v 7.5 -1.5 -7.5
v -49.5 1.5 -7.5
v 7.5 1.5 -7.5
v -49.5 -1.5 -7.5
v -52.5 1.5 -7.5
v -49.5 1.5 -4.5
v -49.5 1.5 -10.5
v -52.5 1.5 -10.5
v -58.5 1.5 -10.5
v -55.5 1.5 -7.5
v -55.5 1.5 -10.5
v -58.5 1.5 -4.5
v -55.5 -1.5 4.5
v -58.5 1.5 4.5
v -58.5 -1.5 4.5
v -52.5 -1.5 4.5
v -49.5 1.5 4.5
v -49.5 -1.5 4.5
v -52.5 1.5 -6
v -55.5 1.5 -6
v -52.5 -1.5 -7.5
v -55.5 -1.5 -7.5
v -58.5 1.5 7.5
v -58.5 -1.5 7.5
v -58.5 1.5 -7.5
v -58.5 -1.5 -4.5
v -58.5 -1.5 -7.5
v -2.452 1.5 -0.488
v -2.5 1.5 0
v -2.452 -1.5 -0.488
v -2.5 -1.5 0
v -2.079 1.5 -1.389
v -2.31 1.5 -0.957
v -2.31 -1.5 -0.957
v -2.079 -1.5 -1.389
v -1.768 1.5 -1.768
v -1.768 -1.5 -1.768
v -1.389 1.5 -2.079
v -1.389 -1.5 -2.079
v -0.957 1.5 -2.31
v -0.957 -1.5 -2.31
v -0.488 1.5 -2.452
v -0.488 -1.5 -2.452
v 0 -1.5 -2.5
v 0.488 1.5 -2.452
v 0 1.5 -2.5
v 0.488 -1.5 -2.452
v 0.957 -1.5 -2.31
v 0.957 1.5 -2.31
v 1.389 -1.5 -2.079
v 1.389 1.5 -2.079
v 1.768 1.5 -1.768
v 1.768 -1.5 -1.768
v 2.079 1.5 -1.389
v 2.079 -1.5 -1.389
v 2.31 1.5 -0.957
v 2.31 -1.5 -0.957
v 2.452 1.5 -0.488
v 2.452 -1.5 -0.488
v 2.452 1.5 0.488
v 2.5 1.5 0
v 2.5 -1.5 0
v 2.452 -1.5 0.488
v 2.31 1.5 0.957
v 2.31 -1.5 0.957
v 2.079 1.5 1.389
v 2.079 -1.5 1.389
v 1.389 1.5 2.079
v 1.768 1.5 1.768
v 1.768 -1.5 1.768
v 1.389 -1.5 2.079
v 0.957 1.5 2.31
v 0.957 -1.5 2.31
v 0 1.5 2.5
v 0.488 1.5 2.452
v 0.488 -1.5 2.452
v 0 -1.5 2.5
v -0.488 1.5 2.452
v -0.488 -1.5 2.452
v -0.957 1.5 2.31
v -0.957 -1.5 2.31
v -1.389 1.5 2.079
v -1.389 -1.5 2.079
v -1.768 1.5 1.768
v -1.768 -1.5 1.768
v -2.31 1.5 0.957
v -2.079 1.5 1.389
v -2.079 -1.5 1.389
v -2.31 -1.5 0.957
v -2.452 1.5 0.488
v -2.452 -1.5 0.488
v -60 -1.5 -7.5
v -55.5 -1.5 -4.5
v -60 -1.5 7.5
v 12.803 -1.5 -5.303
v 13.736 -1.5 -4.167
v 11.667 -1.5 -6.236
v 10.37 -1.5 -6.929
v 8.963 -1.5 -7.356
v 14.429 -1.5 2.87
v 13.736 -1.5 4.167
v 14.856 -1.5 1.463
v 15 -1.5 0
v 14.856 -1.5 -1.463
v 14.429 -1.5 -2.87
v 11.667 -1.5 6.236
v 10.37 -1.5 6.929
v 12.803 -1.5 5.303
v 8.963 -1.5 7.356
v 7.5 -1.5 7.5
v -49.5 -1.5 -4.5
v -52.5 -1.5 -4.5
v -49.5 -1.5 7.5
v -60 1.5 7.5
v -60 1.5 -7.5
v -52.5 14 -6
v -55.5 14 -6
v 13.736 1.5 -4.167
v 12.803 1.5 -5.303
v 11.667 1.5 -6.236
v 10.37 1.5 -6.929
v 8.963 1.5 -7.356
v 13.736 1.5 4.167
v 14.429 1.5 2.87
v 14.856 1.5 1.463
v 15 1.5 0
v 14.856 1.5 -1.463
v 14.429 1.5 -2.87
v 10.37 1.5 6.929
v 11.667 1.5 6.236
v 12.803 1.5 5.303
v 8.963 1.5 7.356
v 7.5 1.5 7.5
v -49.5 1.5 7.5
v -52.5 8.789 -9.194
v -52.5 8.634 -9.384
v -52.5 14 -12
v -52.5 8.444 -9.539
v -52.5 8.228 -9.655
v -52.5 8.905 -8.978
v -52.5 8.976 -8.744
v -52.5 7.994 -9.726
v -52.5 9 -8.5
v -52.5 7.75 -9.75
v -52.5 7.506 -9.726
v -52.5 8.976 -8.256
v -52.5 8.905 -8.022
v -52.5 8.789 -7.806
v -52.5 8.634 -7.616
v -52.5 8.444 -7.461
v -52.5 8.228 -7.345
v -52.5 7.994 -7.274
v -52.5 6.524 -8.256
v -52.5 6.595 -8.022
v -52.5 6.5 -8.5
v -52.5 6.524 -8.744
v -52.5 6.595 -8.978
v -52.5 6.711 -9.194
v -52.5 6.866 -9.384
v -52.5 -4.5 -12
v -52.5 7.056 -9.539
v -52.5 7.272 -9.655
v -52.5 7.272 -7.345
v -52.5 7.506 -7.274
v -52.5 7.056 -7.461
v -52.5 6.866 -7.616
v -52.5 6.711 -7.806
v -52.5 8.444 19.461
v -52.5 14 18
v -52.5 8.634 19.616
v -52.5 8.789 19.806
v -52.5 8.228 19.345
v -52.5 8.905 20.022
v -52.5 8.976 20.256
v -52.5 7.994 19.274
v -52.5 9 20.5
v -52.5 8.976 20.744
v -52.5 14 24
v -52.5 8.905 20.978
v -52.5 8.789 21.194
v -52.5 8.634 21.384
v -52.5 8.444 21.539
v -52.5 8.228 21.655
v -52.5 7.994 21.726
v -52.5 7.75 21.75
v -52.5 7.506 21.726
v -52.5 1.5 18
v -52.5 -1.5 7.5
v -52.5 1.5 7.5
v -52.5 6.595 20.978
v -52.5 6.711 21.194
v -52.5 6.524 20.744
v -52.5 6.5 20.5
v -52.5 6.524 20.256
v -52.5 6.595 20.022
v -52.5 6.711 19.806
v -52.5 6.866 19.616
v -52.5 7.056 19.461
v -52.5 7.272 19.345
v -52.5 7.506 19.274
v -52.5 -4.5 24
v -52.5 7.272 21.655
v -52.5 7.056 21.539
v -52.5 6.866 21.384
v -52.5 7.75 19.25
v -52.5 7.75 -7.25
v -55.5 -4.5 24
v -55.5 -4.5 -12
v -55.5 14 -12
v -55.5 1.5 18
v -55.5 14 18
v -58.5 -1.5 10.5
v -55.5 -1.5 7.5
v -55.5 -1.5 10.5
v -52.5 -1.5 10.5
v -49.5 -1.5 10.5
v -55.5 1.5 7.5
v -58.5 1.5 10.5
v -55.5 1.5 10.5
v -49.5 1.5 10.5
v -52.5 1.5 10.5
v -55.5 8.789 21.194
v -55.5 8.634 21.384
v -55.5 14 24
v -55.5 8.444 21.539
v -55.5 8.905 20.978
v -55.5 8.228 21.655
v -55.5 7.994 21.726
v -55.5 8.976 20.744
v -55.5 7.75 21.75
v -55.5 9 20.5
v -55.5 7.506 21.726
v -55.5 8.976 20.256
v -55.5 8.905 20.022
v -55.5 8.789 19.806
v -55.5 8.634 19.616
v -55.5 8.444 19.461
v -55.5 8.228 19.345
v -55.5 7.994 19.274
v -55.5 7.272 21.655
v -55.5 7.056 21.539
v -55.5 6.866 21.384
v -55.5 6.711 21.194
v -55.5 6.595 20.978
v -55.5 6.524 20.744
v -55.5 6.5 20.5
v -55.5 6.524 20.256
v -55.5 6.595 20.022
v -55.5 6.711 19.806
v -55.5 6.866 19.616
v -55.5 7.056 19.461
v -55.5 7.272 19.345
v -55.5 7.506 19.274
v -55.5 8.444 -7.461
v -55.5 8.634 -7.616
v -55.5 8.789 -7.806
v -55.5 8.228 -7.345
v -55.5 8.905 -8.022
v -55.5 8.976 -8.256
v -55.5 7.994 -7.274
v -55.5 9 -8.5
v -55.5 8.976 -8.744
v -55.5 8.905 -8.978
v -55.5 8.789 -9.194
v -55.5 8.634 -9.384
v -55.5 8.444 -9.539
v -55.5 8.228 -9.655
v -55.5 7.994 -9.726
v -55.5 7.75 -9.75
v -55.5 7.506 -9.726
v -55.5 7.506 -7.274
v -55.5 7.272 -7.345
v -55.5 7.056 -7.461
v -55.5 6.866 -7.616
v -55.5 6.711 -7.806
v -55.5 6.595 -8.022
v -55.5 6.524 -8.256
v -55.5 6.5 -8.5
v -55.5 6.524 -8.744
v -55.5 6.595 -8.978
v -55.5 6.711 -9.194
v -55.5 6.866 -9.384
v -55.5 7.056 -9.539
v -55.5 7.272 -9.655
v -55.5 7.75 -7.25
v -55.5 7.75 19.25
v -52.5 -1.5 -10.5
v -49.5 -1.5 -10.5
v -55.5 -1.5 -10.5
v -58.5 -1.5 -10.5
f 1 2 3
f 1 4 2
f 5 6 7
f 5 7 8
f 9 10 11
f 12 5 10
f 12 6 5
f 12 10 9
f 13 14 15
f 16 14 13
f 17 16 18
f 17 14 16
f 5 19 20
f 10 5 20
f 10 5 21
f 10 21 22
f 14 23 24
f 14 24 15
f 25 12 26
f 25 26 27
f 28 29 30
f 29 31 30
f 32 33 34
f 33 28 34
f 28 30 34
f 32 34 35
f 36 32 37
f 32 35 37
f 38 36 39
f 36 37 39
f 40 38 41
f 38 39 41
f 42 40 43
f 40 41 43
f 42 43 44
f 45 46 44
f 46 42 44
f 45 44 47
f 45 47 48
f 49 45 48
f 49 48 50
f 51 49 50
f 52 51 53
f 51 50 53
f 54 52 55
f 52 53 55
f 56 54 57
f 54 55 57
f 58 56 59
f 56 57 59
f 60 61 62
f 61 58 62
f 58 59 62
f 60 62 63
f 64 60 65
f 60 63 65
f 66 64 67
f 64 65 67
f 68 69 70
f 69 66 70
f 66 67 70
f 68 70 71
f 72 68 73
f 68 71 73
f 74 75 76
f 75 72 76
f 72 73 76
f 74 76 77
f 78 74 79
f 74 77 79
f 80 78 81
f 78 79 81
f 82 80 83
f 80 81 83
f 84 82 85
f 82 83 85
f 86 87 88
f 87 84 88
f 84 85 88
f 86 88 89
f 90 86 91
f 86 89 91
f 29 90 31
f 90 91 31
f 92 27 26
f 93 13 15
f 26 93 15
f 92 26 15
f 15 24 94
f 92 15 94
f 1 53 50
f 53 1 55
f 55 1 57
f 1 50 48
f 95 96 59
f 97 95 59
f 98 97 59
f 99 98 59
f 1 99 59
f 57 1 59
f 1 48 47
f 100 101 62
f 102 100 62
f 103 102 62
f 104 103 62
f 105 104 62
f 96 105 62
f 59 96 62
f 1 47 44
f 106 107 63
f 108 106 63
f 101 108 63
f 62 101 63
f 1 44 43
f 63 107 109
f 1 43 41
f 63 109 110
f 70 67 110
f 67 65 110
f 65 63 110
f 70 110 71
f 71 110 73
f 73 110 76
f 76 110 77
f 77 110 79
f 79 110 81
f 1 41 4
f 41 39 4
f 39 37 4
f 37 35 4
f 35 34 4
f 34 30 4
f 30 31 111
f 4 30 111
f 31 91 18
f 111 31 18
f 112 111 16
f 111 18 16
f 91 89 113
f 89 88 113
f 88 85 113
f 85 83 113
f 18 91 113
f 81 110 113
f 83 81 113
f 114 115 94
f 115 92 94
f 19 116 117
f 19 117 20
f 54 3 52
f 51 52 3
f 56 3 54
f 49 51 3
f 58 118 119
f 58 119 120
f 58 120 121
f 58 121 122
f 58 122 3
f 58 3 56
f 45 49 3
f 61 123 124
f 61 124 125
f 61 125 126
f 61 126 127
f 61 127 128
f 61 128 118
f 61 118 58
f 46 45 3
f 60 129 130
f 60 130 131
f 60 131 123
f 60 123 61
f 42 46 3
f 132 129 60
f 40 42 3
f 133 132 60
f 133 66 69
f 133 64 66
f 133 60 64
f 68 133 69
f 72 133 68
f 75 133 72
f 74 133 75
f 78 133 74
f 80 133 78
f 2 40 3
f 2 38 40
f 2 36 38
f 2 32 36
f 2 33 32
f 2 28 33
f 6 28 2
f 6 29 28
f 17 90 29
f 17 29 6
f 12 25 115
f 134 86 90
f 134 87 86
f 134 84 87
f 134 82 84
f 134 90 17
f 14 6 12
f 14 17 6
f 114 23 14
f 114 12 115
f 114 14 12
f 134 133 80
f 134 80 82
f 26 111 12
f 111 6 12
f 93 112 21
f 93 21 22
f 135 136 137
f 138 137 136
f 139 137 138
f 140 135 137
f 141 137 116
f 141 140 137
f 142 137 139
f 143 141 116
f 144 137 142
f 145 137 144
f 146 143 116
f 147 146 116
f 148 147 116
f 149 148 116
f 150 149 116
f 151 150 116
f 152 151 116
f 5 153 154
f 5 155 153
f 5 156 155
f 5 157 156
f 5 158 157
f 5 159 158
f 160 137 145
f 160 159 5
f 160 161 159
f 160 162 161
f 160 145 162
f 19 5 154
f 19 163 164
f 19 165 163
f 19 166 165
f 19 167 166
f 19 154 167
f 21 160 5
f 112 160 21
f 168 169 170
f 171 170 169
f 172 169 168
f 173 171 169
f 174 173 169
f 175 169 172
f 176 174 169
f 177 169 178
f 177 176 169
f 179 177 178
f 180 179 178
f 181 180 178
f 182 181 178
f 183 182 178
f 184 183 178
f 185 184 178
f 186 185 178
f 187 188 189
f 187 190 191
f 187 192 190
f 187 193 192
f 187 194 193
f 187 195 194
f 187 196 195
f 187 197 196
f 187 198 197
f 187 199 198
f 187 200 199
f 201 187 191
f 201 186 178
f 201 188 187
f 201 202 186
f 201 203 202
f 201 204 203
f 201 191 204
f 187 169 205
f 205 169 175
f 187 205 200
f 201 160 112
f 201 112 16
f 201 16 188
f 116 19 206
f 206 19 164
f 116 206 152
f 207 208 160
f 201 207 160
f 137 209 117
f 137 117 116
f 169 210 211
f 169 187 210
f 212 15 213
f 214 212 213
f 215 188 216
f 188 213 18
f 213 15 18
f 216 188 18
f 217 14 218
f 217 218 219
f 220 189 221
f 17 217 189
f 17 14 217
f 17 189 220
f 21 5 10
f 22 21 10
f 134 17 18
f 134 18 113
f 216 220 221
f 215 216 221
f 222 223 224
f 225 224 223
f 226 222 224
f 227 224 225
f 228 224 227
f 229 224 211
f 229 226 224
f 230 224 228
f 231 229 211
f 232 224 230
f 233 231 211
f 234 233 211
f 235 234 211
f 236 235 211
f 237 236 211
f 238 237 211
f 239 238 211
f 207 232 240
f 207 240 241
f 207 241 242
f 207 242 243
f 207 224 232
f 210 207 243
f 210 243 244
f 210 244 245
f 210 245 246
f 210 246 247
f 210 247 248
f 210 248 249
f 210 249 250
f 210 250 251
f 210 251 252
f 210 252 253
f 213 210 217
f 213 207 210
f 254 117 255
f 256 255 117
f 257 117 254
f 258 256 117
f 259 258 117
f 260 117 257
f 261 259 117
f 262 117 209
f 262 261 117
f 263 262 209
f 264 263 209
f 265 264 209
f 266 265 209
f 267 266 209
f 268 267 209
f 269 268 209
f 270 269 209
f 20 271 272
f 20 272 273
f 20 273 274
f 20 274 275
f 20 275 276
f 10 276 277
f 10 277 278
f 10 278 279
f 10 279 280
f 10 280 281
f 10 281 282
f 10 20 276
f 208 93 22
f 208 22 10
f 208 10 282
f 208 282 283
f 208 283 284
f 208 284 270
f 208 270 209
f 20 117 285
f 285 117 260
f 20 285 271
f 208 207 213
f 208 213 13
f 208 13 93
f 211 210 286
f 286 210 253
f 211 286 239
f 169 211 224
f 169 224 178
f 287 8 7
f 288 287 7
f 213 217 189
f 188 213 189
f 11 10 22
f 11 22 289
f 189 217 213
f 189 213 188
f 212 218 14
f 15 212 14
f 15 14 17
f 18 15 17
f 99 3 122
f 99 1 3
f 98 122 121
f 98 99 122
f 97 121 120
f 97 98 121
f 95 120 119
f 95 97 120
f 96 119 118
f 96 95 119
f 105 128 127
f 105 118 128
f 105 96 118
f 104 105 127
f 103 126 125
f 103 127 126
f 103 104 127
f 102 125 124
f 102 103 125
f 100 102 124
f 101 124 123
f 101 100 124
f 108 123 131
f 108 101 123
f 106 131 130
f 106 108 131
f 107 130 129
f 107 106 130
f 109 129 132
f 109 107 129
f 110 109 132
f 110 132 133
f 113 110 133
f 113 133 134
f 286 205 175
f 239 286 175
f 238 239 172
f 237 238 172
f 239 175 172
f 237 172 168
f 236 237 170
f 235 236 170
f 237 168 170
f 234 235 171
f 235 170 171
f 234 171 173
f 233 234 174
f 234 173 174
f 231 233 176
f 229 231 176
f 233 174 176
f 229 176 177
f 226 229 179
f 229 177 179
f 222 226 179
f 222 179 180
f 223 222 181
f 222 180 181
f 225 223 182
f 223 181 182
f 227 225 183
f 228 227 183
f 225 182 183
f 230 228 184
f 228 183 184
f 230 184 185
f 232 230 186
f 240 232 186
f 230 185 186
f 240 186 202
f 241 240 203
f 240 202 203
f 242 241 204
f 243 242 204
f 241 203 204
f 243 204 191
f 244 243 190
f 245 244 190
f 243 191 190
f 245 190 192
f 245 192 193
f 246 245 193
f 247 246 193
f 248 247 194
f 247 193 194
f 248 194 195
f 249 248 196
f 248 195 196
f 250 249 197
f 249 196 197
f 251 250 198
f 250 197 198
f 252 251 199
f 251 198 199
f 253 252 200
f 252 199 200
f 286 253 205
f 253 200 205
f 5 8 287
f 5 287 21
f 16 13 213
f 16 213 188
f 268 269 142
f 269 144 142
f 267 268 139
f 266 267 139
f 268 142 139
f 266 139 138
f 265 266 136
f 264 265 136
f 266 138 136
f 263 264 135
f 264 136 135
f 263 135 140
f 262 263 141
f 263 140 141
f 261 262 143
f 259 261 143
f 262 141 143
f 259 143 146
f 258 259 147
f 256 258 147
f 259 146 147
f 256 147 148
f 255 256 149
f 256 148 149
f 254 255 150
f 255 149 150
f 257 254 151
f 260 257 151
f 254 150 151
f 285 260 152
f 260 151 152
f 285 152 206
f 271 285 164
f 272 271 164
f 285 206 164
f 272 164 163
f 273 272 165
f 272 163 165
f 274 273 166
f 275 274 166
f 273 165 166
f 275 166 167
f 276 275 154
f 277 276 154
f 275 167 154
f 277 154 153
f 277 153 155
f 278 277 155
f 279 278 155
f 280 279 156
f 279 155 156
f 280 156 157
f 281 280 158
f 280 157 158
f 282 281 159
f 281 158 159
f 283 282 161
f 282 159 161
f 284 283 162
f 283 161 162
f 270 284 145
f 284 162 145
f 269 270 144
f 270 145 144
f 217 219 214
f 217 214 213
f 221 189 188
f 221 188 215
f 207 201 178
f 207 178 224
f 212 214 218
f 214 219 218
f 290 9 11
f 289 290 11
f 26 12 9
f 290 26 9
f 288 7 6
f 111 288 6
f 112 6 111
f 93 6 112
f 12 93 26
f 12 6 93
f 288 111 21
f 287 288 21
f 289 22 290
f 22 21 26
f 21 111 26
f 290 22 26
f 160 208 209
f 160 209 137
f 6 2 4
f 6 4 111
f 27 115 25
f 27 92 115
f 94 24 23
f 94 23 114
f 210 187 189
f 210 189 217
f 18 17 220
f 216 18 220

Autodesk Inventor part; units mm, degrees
ref_plane "YZ Plane" through (0, 0, 0) normal (1, 0, 0) x (0, 1, 0)
ref_plane "XZ Plane" through (0, 0, 0) normal (0, 1, 0) x (-1, 0, 0)
ref_plane "XY Plane" through (0, 0, 0) normal (0, 0, 1) x (1, 0, 0)
sketch "草圖1" plane through (0, 0, 0) normal (0, 1, 0) x (-1, 0, 0)
  circle A0 centre (0, 0) radius 2.5
  line L0 (-15, 0) -> (60, 0) construction
  line L1 (-7.5, 7.5) -> (52.5, 7.5)
  line L2 (52.5, -7.5) -> (-7.5, -7.5)
  arc A1 (-7.5, 7.5) -> (-7.5, -7.5) centre (-7.5, 0) ccw
  arc A2 (52.5, -7.5) -> (52.5, 7.5) centre (52.5, 0) ccw
  line L3 (52.5, -7.5) -> (60, -7.5)
  line L4 (60, -7.5) -> (60, 7.5)
  line L5 (60, 7.5) -> (52.5, 7.5)
  line L6 (52.5, 7.5) -> (52.5, -7.5)
  point P0 (22.5, 0)
  point P1 (60, 0)
  point P2 (-15, 0)
  point P3 (60, 0)
  dimension "d0" = 5
  dimension "d5" = 15
  dimension "d6" = 60
  dimension "d7" = 15
extrude "擠出1" add sketch "草圖1" along normal mid plane 3
sketch "草圖2" plane through (0, 1.5, 0) normal (0, 1, 0) x (1, 0, 0)
  arc A0 (7.5, -7.5) -> (7.5, 7.5) centre (7.5, 0) ccw construction
  circle A1 centre (0, 0) radius 2.5 construction
  line L0 (-55.5, 12) -> (-52.5, 12)
  line L1 (-52.5, 12) -> (-52.5, -24)
  line L2 (-52.5, -24) -> (-55.5, -24)
  line L3 (-55.5, -24) -> (-55.5, 12)
  line L4 (-55.5, 6) -> (-52.5, 6)
  line L5 (-52.5, 6) -> (-52.5, -18)
  line L6 (-52.5, -18) -> (-55.5, -18)
  line L7 (-55.5, -18) -> (-55.5, 6)
  line L8 (-75, 0) -> (30, 0) construction
  line L9 (-60, -7.5) -> (7.5, -7.5) projected
  line L10 (7.5, 7.5) -> (-60, 7.5) projected
  line L11 (-60, 7.5) -> (-60, -7.5) projected
  point P0 (-52.5, -6)
  point P1 (-54, -18)
  point P2 (-54, 6)
  dimension "d10" = 36
  dimension "d11" = 3
  dimension "d12" = 24
  dimension "d14" = 6
  dimension "d32" = 4.5
extrude "擠出2" add sketch "草圖2" along normal blind 12.5 and the other way blind 6 contours L0 L1 L10 L3 | L10 L1 L4 L3 | L4 L1 L9 L3 | L9 L1 L6 L3 | L6 L1 L2 L3
sketch "草圖3" plane through (-52.5, -4.5, -12) normal (1, 0, 0) x (0, 0, -1)
  line L0 (0, 0) -> (0, 18.5) projected
  line L1 (-36, 18.5) -> (0, 18.5) projected
  line L2 (-36, 18.5) -> (-36, 0) projected
  line L3 (0, 0) -> (-36, 0) projected
  line L4 (-19.5, 3) -> (-4.5, 3) projected
  line L5 (-19.5, 6) -> (-19.5, 3) projected
  line L6 (-4.5, 6) -> (-19.5, 6) projected
  line L7 (-4.5, 3) -> (-4.5, 6) projected
  line L8 (0, 18.5) -> (-36, 18.5) projected
  line L9 (-30, 18.5) -> (-6, 18.5)
  line L10 (-6, 18.5) -> (-6, 6)
  line L11 (-6, 6) -> (-30, 6)
  line L12 (-30, 6) -> (-30, 18.5)
  point P0 (-12, 4.5)
  point P1 (-18, 18.5)
  point P2 (-19.5, 6)
  point P3 (-6, 18.5)
  dimension "d19" = 24
  dimension "d20" = 12.5
extrude "擠出3" cut sketch "草圖3" against normal up to surface (3 mm away) contours L10 L6 L11 L12 L1
sketch "草圖4" plane through (-52.5, -4.5, 24) normal (1, 0, 0) x (0, 0, -1)
  line L0 (6, 6) -> (6, 18.5) construction
  line L1 (0, 18.5) -> (6, 18.5) construction
  line L2 (0, 18.5) -> (0, 0) construction
  line L3 (36, 0) -> (0, 0) construction
  line L4 (36, 0) -> (36, 18.5) construction
  line L5 (30, 18.5) -> (36, 18.5) construction
  line L6 (30, 18.5) -> (30, 6) construction
  line L7 (31.5, 6) -> (30, 6) construction
  line L8 (31.5, 3) -> (31.5, 6) construction
  line L9 (16.5, 3) -> (31.5, 3) construction
  line L10 (16.5, 6) -> (16.5, 3) construction
  line L11 (16.5, 6) -> (6, 6) construction
  line L12 (0, 0) -> (0, 18.5) construction
  line L13 (0, 12.25) -> (36, 12.25) construction
  line L14 (36, 0) -> (36, 18.5) construction
  circle A0 centre (3.5, 12.25) radius 1.25
  circle A1 centre (32.5, 12.25) radius 1.25
  line L15 (18, 12.25) -> (18, 14.7148) construction
  point P0 (24, 4.5)
  point P1 (6, 12.25)
  dimension "d23" = 2.5
  dimension "d24" = 29
extrude "擠出4" cut sketch "草圖4" against normal up to surface (3 mm away)
sketch "草圖5" plane through (0, 1.5, 0) normal (0, 1, 0) x (1, 0, 0)
  line L0 (-52.5, 12) -> (-52.5, -24) construction
  line L1 (-52.5, -24) -> (-55.5, -24) construction
  line L2 (-55.5, -24) -> (-55.5, 12) construction
  line L3 (-55.5, 12) -> (-52.5, 12) construction
  line L4 (-49.5, -10.5) -> (-52.5, -10.5)
  line L5 (-58.5, -10.5) -> (-58.5, -7.5)
  line L6 (-58.5, -4.5) -> (-55.5, -4.5)
  line L7 (-49.5, -4.5) -> (-49.5, -7.5)
  line L8 (-52.5, -4.5) -> (-49.5, -4.5)
  line L9 (-55.5, -4.5) -> (-52.5, -4.5)
  line L10 (-49.5, -7.5) -> (-49.5, -10.5)
  line L11 (-58.5, -7.5) -> (-58.5, -4.5)
  line L12 (-52.5, -10.5) -> (-55.5, -10.5)
  line L13 (-55.5, -10.5) -> (-58.5, -10.5)
  line L14 (-52.5, -10.5) -> (-55.5, -10.5)
  line L15 (-55.5, -10.5) -> (-55.5, -7.5)
  line L16 (-55.5, -7.5) -> (-52.5, -7.5)
  line L17 (-52.5, -7.5) -> (-52.5, -10.5)
  point P0 (0, 0)
  point P1 (-55.5, -10.5)
extrude "擠出5" cut sketch "草圖5" against normal blind 3 contours L4 L17 L16 L15 L13 L5 L11 L6 L9 L8 L7 L10
extrude "擠出6" add sketch "草圖5" against normal blind 3 separate body contours L4 L17 L16 L15 L13 L5 L11 L6 L9 L8 L7 L10
mirror "鏡射1" about plane through (0, 0, 0) normal (0, 0, 1) of "擠出5" bodies 1
mirror "鏡射2" about plane through (0, 0, 0) normal (0, 0, 1) of "擠出6" bodies 2
properties part number "Arm_3"
